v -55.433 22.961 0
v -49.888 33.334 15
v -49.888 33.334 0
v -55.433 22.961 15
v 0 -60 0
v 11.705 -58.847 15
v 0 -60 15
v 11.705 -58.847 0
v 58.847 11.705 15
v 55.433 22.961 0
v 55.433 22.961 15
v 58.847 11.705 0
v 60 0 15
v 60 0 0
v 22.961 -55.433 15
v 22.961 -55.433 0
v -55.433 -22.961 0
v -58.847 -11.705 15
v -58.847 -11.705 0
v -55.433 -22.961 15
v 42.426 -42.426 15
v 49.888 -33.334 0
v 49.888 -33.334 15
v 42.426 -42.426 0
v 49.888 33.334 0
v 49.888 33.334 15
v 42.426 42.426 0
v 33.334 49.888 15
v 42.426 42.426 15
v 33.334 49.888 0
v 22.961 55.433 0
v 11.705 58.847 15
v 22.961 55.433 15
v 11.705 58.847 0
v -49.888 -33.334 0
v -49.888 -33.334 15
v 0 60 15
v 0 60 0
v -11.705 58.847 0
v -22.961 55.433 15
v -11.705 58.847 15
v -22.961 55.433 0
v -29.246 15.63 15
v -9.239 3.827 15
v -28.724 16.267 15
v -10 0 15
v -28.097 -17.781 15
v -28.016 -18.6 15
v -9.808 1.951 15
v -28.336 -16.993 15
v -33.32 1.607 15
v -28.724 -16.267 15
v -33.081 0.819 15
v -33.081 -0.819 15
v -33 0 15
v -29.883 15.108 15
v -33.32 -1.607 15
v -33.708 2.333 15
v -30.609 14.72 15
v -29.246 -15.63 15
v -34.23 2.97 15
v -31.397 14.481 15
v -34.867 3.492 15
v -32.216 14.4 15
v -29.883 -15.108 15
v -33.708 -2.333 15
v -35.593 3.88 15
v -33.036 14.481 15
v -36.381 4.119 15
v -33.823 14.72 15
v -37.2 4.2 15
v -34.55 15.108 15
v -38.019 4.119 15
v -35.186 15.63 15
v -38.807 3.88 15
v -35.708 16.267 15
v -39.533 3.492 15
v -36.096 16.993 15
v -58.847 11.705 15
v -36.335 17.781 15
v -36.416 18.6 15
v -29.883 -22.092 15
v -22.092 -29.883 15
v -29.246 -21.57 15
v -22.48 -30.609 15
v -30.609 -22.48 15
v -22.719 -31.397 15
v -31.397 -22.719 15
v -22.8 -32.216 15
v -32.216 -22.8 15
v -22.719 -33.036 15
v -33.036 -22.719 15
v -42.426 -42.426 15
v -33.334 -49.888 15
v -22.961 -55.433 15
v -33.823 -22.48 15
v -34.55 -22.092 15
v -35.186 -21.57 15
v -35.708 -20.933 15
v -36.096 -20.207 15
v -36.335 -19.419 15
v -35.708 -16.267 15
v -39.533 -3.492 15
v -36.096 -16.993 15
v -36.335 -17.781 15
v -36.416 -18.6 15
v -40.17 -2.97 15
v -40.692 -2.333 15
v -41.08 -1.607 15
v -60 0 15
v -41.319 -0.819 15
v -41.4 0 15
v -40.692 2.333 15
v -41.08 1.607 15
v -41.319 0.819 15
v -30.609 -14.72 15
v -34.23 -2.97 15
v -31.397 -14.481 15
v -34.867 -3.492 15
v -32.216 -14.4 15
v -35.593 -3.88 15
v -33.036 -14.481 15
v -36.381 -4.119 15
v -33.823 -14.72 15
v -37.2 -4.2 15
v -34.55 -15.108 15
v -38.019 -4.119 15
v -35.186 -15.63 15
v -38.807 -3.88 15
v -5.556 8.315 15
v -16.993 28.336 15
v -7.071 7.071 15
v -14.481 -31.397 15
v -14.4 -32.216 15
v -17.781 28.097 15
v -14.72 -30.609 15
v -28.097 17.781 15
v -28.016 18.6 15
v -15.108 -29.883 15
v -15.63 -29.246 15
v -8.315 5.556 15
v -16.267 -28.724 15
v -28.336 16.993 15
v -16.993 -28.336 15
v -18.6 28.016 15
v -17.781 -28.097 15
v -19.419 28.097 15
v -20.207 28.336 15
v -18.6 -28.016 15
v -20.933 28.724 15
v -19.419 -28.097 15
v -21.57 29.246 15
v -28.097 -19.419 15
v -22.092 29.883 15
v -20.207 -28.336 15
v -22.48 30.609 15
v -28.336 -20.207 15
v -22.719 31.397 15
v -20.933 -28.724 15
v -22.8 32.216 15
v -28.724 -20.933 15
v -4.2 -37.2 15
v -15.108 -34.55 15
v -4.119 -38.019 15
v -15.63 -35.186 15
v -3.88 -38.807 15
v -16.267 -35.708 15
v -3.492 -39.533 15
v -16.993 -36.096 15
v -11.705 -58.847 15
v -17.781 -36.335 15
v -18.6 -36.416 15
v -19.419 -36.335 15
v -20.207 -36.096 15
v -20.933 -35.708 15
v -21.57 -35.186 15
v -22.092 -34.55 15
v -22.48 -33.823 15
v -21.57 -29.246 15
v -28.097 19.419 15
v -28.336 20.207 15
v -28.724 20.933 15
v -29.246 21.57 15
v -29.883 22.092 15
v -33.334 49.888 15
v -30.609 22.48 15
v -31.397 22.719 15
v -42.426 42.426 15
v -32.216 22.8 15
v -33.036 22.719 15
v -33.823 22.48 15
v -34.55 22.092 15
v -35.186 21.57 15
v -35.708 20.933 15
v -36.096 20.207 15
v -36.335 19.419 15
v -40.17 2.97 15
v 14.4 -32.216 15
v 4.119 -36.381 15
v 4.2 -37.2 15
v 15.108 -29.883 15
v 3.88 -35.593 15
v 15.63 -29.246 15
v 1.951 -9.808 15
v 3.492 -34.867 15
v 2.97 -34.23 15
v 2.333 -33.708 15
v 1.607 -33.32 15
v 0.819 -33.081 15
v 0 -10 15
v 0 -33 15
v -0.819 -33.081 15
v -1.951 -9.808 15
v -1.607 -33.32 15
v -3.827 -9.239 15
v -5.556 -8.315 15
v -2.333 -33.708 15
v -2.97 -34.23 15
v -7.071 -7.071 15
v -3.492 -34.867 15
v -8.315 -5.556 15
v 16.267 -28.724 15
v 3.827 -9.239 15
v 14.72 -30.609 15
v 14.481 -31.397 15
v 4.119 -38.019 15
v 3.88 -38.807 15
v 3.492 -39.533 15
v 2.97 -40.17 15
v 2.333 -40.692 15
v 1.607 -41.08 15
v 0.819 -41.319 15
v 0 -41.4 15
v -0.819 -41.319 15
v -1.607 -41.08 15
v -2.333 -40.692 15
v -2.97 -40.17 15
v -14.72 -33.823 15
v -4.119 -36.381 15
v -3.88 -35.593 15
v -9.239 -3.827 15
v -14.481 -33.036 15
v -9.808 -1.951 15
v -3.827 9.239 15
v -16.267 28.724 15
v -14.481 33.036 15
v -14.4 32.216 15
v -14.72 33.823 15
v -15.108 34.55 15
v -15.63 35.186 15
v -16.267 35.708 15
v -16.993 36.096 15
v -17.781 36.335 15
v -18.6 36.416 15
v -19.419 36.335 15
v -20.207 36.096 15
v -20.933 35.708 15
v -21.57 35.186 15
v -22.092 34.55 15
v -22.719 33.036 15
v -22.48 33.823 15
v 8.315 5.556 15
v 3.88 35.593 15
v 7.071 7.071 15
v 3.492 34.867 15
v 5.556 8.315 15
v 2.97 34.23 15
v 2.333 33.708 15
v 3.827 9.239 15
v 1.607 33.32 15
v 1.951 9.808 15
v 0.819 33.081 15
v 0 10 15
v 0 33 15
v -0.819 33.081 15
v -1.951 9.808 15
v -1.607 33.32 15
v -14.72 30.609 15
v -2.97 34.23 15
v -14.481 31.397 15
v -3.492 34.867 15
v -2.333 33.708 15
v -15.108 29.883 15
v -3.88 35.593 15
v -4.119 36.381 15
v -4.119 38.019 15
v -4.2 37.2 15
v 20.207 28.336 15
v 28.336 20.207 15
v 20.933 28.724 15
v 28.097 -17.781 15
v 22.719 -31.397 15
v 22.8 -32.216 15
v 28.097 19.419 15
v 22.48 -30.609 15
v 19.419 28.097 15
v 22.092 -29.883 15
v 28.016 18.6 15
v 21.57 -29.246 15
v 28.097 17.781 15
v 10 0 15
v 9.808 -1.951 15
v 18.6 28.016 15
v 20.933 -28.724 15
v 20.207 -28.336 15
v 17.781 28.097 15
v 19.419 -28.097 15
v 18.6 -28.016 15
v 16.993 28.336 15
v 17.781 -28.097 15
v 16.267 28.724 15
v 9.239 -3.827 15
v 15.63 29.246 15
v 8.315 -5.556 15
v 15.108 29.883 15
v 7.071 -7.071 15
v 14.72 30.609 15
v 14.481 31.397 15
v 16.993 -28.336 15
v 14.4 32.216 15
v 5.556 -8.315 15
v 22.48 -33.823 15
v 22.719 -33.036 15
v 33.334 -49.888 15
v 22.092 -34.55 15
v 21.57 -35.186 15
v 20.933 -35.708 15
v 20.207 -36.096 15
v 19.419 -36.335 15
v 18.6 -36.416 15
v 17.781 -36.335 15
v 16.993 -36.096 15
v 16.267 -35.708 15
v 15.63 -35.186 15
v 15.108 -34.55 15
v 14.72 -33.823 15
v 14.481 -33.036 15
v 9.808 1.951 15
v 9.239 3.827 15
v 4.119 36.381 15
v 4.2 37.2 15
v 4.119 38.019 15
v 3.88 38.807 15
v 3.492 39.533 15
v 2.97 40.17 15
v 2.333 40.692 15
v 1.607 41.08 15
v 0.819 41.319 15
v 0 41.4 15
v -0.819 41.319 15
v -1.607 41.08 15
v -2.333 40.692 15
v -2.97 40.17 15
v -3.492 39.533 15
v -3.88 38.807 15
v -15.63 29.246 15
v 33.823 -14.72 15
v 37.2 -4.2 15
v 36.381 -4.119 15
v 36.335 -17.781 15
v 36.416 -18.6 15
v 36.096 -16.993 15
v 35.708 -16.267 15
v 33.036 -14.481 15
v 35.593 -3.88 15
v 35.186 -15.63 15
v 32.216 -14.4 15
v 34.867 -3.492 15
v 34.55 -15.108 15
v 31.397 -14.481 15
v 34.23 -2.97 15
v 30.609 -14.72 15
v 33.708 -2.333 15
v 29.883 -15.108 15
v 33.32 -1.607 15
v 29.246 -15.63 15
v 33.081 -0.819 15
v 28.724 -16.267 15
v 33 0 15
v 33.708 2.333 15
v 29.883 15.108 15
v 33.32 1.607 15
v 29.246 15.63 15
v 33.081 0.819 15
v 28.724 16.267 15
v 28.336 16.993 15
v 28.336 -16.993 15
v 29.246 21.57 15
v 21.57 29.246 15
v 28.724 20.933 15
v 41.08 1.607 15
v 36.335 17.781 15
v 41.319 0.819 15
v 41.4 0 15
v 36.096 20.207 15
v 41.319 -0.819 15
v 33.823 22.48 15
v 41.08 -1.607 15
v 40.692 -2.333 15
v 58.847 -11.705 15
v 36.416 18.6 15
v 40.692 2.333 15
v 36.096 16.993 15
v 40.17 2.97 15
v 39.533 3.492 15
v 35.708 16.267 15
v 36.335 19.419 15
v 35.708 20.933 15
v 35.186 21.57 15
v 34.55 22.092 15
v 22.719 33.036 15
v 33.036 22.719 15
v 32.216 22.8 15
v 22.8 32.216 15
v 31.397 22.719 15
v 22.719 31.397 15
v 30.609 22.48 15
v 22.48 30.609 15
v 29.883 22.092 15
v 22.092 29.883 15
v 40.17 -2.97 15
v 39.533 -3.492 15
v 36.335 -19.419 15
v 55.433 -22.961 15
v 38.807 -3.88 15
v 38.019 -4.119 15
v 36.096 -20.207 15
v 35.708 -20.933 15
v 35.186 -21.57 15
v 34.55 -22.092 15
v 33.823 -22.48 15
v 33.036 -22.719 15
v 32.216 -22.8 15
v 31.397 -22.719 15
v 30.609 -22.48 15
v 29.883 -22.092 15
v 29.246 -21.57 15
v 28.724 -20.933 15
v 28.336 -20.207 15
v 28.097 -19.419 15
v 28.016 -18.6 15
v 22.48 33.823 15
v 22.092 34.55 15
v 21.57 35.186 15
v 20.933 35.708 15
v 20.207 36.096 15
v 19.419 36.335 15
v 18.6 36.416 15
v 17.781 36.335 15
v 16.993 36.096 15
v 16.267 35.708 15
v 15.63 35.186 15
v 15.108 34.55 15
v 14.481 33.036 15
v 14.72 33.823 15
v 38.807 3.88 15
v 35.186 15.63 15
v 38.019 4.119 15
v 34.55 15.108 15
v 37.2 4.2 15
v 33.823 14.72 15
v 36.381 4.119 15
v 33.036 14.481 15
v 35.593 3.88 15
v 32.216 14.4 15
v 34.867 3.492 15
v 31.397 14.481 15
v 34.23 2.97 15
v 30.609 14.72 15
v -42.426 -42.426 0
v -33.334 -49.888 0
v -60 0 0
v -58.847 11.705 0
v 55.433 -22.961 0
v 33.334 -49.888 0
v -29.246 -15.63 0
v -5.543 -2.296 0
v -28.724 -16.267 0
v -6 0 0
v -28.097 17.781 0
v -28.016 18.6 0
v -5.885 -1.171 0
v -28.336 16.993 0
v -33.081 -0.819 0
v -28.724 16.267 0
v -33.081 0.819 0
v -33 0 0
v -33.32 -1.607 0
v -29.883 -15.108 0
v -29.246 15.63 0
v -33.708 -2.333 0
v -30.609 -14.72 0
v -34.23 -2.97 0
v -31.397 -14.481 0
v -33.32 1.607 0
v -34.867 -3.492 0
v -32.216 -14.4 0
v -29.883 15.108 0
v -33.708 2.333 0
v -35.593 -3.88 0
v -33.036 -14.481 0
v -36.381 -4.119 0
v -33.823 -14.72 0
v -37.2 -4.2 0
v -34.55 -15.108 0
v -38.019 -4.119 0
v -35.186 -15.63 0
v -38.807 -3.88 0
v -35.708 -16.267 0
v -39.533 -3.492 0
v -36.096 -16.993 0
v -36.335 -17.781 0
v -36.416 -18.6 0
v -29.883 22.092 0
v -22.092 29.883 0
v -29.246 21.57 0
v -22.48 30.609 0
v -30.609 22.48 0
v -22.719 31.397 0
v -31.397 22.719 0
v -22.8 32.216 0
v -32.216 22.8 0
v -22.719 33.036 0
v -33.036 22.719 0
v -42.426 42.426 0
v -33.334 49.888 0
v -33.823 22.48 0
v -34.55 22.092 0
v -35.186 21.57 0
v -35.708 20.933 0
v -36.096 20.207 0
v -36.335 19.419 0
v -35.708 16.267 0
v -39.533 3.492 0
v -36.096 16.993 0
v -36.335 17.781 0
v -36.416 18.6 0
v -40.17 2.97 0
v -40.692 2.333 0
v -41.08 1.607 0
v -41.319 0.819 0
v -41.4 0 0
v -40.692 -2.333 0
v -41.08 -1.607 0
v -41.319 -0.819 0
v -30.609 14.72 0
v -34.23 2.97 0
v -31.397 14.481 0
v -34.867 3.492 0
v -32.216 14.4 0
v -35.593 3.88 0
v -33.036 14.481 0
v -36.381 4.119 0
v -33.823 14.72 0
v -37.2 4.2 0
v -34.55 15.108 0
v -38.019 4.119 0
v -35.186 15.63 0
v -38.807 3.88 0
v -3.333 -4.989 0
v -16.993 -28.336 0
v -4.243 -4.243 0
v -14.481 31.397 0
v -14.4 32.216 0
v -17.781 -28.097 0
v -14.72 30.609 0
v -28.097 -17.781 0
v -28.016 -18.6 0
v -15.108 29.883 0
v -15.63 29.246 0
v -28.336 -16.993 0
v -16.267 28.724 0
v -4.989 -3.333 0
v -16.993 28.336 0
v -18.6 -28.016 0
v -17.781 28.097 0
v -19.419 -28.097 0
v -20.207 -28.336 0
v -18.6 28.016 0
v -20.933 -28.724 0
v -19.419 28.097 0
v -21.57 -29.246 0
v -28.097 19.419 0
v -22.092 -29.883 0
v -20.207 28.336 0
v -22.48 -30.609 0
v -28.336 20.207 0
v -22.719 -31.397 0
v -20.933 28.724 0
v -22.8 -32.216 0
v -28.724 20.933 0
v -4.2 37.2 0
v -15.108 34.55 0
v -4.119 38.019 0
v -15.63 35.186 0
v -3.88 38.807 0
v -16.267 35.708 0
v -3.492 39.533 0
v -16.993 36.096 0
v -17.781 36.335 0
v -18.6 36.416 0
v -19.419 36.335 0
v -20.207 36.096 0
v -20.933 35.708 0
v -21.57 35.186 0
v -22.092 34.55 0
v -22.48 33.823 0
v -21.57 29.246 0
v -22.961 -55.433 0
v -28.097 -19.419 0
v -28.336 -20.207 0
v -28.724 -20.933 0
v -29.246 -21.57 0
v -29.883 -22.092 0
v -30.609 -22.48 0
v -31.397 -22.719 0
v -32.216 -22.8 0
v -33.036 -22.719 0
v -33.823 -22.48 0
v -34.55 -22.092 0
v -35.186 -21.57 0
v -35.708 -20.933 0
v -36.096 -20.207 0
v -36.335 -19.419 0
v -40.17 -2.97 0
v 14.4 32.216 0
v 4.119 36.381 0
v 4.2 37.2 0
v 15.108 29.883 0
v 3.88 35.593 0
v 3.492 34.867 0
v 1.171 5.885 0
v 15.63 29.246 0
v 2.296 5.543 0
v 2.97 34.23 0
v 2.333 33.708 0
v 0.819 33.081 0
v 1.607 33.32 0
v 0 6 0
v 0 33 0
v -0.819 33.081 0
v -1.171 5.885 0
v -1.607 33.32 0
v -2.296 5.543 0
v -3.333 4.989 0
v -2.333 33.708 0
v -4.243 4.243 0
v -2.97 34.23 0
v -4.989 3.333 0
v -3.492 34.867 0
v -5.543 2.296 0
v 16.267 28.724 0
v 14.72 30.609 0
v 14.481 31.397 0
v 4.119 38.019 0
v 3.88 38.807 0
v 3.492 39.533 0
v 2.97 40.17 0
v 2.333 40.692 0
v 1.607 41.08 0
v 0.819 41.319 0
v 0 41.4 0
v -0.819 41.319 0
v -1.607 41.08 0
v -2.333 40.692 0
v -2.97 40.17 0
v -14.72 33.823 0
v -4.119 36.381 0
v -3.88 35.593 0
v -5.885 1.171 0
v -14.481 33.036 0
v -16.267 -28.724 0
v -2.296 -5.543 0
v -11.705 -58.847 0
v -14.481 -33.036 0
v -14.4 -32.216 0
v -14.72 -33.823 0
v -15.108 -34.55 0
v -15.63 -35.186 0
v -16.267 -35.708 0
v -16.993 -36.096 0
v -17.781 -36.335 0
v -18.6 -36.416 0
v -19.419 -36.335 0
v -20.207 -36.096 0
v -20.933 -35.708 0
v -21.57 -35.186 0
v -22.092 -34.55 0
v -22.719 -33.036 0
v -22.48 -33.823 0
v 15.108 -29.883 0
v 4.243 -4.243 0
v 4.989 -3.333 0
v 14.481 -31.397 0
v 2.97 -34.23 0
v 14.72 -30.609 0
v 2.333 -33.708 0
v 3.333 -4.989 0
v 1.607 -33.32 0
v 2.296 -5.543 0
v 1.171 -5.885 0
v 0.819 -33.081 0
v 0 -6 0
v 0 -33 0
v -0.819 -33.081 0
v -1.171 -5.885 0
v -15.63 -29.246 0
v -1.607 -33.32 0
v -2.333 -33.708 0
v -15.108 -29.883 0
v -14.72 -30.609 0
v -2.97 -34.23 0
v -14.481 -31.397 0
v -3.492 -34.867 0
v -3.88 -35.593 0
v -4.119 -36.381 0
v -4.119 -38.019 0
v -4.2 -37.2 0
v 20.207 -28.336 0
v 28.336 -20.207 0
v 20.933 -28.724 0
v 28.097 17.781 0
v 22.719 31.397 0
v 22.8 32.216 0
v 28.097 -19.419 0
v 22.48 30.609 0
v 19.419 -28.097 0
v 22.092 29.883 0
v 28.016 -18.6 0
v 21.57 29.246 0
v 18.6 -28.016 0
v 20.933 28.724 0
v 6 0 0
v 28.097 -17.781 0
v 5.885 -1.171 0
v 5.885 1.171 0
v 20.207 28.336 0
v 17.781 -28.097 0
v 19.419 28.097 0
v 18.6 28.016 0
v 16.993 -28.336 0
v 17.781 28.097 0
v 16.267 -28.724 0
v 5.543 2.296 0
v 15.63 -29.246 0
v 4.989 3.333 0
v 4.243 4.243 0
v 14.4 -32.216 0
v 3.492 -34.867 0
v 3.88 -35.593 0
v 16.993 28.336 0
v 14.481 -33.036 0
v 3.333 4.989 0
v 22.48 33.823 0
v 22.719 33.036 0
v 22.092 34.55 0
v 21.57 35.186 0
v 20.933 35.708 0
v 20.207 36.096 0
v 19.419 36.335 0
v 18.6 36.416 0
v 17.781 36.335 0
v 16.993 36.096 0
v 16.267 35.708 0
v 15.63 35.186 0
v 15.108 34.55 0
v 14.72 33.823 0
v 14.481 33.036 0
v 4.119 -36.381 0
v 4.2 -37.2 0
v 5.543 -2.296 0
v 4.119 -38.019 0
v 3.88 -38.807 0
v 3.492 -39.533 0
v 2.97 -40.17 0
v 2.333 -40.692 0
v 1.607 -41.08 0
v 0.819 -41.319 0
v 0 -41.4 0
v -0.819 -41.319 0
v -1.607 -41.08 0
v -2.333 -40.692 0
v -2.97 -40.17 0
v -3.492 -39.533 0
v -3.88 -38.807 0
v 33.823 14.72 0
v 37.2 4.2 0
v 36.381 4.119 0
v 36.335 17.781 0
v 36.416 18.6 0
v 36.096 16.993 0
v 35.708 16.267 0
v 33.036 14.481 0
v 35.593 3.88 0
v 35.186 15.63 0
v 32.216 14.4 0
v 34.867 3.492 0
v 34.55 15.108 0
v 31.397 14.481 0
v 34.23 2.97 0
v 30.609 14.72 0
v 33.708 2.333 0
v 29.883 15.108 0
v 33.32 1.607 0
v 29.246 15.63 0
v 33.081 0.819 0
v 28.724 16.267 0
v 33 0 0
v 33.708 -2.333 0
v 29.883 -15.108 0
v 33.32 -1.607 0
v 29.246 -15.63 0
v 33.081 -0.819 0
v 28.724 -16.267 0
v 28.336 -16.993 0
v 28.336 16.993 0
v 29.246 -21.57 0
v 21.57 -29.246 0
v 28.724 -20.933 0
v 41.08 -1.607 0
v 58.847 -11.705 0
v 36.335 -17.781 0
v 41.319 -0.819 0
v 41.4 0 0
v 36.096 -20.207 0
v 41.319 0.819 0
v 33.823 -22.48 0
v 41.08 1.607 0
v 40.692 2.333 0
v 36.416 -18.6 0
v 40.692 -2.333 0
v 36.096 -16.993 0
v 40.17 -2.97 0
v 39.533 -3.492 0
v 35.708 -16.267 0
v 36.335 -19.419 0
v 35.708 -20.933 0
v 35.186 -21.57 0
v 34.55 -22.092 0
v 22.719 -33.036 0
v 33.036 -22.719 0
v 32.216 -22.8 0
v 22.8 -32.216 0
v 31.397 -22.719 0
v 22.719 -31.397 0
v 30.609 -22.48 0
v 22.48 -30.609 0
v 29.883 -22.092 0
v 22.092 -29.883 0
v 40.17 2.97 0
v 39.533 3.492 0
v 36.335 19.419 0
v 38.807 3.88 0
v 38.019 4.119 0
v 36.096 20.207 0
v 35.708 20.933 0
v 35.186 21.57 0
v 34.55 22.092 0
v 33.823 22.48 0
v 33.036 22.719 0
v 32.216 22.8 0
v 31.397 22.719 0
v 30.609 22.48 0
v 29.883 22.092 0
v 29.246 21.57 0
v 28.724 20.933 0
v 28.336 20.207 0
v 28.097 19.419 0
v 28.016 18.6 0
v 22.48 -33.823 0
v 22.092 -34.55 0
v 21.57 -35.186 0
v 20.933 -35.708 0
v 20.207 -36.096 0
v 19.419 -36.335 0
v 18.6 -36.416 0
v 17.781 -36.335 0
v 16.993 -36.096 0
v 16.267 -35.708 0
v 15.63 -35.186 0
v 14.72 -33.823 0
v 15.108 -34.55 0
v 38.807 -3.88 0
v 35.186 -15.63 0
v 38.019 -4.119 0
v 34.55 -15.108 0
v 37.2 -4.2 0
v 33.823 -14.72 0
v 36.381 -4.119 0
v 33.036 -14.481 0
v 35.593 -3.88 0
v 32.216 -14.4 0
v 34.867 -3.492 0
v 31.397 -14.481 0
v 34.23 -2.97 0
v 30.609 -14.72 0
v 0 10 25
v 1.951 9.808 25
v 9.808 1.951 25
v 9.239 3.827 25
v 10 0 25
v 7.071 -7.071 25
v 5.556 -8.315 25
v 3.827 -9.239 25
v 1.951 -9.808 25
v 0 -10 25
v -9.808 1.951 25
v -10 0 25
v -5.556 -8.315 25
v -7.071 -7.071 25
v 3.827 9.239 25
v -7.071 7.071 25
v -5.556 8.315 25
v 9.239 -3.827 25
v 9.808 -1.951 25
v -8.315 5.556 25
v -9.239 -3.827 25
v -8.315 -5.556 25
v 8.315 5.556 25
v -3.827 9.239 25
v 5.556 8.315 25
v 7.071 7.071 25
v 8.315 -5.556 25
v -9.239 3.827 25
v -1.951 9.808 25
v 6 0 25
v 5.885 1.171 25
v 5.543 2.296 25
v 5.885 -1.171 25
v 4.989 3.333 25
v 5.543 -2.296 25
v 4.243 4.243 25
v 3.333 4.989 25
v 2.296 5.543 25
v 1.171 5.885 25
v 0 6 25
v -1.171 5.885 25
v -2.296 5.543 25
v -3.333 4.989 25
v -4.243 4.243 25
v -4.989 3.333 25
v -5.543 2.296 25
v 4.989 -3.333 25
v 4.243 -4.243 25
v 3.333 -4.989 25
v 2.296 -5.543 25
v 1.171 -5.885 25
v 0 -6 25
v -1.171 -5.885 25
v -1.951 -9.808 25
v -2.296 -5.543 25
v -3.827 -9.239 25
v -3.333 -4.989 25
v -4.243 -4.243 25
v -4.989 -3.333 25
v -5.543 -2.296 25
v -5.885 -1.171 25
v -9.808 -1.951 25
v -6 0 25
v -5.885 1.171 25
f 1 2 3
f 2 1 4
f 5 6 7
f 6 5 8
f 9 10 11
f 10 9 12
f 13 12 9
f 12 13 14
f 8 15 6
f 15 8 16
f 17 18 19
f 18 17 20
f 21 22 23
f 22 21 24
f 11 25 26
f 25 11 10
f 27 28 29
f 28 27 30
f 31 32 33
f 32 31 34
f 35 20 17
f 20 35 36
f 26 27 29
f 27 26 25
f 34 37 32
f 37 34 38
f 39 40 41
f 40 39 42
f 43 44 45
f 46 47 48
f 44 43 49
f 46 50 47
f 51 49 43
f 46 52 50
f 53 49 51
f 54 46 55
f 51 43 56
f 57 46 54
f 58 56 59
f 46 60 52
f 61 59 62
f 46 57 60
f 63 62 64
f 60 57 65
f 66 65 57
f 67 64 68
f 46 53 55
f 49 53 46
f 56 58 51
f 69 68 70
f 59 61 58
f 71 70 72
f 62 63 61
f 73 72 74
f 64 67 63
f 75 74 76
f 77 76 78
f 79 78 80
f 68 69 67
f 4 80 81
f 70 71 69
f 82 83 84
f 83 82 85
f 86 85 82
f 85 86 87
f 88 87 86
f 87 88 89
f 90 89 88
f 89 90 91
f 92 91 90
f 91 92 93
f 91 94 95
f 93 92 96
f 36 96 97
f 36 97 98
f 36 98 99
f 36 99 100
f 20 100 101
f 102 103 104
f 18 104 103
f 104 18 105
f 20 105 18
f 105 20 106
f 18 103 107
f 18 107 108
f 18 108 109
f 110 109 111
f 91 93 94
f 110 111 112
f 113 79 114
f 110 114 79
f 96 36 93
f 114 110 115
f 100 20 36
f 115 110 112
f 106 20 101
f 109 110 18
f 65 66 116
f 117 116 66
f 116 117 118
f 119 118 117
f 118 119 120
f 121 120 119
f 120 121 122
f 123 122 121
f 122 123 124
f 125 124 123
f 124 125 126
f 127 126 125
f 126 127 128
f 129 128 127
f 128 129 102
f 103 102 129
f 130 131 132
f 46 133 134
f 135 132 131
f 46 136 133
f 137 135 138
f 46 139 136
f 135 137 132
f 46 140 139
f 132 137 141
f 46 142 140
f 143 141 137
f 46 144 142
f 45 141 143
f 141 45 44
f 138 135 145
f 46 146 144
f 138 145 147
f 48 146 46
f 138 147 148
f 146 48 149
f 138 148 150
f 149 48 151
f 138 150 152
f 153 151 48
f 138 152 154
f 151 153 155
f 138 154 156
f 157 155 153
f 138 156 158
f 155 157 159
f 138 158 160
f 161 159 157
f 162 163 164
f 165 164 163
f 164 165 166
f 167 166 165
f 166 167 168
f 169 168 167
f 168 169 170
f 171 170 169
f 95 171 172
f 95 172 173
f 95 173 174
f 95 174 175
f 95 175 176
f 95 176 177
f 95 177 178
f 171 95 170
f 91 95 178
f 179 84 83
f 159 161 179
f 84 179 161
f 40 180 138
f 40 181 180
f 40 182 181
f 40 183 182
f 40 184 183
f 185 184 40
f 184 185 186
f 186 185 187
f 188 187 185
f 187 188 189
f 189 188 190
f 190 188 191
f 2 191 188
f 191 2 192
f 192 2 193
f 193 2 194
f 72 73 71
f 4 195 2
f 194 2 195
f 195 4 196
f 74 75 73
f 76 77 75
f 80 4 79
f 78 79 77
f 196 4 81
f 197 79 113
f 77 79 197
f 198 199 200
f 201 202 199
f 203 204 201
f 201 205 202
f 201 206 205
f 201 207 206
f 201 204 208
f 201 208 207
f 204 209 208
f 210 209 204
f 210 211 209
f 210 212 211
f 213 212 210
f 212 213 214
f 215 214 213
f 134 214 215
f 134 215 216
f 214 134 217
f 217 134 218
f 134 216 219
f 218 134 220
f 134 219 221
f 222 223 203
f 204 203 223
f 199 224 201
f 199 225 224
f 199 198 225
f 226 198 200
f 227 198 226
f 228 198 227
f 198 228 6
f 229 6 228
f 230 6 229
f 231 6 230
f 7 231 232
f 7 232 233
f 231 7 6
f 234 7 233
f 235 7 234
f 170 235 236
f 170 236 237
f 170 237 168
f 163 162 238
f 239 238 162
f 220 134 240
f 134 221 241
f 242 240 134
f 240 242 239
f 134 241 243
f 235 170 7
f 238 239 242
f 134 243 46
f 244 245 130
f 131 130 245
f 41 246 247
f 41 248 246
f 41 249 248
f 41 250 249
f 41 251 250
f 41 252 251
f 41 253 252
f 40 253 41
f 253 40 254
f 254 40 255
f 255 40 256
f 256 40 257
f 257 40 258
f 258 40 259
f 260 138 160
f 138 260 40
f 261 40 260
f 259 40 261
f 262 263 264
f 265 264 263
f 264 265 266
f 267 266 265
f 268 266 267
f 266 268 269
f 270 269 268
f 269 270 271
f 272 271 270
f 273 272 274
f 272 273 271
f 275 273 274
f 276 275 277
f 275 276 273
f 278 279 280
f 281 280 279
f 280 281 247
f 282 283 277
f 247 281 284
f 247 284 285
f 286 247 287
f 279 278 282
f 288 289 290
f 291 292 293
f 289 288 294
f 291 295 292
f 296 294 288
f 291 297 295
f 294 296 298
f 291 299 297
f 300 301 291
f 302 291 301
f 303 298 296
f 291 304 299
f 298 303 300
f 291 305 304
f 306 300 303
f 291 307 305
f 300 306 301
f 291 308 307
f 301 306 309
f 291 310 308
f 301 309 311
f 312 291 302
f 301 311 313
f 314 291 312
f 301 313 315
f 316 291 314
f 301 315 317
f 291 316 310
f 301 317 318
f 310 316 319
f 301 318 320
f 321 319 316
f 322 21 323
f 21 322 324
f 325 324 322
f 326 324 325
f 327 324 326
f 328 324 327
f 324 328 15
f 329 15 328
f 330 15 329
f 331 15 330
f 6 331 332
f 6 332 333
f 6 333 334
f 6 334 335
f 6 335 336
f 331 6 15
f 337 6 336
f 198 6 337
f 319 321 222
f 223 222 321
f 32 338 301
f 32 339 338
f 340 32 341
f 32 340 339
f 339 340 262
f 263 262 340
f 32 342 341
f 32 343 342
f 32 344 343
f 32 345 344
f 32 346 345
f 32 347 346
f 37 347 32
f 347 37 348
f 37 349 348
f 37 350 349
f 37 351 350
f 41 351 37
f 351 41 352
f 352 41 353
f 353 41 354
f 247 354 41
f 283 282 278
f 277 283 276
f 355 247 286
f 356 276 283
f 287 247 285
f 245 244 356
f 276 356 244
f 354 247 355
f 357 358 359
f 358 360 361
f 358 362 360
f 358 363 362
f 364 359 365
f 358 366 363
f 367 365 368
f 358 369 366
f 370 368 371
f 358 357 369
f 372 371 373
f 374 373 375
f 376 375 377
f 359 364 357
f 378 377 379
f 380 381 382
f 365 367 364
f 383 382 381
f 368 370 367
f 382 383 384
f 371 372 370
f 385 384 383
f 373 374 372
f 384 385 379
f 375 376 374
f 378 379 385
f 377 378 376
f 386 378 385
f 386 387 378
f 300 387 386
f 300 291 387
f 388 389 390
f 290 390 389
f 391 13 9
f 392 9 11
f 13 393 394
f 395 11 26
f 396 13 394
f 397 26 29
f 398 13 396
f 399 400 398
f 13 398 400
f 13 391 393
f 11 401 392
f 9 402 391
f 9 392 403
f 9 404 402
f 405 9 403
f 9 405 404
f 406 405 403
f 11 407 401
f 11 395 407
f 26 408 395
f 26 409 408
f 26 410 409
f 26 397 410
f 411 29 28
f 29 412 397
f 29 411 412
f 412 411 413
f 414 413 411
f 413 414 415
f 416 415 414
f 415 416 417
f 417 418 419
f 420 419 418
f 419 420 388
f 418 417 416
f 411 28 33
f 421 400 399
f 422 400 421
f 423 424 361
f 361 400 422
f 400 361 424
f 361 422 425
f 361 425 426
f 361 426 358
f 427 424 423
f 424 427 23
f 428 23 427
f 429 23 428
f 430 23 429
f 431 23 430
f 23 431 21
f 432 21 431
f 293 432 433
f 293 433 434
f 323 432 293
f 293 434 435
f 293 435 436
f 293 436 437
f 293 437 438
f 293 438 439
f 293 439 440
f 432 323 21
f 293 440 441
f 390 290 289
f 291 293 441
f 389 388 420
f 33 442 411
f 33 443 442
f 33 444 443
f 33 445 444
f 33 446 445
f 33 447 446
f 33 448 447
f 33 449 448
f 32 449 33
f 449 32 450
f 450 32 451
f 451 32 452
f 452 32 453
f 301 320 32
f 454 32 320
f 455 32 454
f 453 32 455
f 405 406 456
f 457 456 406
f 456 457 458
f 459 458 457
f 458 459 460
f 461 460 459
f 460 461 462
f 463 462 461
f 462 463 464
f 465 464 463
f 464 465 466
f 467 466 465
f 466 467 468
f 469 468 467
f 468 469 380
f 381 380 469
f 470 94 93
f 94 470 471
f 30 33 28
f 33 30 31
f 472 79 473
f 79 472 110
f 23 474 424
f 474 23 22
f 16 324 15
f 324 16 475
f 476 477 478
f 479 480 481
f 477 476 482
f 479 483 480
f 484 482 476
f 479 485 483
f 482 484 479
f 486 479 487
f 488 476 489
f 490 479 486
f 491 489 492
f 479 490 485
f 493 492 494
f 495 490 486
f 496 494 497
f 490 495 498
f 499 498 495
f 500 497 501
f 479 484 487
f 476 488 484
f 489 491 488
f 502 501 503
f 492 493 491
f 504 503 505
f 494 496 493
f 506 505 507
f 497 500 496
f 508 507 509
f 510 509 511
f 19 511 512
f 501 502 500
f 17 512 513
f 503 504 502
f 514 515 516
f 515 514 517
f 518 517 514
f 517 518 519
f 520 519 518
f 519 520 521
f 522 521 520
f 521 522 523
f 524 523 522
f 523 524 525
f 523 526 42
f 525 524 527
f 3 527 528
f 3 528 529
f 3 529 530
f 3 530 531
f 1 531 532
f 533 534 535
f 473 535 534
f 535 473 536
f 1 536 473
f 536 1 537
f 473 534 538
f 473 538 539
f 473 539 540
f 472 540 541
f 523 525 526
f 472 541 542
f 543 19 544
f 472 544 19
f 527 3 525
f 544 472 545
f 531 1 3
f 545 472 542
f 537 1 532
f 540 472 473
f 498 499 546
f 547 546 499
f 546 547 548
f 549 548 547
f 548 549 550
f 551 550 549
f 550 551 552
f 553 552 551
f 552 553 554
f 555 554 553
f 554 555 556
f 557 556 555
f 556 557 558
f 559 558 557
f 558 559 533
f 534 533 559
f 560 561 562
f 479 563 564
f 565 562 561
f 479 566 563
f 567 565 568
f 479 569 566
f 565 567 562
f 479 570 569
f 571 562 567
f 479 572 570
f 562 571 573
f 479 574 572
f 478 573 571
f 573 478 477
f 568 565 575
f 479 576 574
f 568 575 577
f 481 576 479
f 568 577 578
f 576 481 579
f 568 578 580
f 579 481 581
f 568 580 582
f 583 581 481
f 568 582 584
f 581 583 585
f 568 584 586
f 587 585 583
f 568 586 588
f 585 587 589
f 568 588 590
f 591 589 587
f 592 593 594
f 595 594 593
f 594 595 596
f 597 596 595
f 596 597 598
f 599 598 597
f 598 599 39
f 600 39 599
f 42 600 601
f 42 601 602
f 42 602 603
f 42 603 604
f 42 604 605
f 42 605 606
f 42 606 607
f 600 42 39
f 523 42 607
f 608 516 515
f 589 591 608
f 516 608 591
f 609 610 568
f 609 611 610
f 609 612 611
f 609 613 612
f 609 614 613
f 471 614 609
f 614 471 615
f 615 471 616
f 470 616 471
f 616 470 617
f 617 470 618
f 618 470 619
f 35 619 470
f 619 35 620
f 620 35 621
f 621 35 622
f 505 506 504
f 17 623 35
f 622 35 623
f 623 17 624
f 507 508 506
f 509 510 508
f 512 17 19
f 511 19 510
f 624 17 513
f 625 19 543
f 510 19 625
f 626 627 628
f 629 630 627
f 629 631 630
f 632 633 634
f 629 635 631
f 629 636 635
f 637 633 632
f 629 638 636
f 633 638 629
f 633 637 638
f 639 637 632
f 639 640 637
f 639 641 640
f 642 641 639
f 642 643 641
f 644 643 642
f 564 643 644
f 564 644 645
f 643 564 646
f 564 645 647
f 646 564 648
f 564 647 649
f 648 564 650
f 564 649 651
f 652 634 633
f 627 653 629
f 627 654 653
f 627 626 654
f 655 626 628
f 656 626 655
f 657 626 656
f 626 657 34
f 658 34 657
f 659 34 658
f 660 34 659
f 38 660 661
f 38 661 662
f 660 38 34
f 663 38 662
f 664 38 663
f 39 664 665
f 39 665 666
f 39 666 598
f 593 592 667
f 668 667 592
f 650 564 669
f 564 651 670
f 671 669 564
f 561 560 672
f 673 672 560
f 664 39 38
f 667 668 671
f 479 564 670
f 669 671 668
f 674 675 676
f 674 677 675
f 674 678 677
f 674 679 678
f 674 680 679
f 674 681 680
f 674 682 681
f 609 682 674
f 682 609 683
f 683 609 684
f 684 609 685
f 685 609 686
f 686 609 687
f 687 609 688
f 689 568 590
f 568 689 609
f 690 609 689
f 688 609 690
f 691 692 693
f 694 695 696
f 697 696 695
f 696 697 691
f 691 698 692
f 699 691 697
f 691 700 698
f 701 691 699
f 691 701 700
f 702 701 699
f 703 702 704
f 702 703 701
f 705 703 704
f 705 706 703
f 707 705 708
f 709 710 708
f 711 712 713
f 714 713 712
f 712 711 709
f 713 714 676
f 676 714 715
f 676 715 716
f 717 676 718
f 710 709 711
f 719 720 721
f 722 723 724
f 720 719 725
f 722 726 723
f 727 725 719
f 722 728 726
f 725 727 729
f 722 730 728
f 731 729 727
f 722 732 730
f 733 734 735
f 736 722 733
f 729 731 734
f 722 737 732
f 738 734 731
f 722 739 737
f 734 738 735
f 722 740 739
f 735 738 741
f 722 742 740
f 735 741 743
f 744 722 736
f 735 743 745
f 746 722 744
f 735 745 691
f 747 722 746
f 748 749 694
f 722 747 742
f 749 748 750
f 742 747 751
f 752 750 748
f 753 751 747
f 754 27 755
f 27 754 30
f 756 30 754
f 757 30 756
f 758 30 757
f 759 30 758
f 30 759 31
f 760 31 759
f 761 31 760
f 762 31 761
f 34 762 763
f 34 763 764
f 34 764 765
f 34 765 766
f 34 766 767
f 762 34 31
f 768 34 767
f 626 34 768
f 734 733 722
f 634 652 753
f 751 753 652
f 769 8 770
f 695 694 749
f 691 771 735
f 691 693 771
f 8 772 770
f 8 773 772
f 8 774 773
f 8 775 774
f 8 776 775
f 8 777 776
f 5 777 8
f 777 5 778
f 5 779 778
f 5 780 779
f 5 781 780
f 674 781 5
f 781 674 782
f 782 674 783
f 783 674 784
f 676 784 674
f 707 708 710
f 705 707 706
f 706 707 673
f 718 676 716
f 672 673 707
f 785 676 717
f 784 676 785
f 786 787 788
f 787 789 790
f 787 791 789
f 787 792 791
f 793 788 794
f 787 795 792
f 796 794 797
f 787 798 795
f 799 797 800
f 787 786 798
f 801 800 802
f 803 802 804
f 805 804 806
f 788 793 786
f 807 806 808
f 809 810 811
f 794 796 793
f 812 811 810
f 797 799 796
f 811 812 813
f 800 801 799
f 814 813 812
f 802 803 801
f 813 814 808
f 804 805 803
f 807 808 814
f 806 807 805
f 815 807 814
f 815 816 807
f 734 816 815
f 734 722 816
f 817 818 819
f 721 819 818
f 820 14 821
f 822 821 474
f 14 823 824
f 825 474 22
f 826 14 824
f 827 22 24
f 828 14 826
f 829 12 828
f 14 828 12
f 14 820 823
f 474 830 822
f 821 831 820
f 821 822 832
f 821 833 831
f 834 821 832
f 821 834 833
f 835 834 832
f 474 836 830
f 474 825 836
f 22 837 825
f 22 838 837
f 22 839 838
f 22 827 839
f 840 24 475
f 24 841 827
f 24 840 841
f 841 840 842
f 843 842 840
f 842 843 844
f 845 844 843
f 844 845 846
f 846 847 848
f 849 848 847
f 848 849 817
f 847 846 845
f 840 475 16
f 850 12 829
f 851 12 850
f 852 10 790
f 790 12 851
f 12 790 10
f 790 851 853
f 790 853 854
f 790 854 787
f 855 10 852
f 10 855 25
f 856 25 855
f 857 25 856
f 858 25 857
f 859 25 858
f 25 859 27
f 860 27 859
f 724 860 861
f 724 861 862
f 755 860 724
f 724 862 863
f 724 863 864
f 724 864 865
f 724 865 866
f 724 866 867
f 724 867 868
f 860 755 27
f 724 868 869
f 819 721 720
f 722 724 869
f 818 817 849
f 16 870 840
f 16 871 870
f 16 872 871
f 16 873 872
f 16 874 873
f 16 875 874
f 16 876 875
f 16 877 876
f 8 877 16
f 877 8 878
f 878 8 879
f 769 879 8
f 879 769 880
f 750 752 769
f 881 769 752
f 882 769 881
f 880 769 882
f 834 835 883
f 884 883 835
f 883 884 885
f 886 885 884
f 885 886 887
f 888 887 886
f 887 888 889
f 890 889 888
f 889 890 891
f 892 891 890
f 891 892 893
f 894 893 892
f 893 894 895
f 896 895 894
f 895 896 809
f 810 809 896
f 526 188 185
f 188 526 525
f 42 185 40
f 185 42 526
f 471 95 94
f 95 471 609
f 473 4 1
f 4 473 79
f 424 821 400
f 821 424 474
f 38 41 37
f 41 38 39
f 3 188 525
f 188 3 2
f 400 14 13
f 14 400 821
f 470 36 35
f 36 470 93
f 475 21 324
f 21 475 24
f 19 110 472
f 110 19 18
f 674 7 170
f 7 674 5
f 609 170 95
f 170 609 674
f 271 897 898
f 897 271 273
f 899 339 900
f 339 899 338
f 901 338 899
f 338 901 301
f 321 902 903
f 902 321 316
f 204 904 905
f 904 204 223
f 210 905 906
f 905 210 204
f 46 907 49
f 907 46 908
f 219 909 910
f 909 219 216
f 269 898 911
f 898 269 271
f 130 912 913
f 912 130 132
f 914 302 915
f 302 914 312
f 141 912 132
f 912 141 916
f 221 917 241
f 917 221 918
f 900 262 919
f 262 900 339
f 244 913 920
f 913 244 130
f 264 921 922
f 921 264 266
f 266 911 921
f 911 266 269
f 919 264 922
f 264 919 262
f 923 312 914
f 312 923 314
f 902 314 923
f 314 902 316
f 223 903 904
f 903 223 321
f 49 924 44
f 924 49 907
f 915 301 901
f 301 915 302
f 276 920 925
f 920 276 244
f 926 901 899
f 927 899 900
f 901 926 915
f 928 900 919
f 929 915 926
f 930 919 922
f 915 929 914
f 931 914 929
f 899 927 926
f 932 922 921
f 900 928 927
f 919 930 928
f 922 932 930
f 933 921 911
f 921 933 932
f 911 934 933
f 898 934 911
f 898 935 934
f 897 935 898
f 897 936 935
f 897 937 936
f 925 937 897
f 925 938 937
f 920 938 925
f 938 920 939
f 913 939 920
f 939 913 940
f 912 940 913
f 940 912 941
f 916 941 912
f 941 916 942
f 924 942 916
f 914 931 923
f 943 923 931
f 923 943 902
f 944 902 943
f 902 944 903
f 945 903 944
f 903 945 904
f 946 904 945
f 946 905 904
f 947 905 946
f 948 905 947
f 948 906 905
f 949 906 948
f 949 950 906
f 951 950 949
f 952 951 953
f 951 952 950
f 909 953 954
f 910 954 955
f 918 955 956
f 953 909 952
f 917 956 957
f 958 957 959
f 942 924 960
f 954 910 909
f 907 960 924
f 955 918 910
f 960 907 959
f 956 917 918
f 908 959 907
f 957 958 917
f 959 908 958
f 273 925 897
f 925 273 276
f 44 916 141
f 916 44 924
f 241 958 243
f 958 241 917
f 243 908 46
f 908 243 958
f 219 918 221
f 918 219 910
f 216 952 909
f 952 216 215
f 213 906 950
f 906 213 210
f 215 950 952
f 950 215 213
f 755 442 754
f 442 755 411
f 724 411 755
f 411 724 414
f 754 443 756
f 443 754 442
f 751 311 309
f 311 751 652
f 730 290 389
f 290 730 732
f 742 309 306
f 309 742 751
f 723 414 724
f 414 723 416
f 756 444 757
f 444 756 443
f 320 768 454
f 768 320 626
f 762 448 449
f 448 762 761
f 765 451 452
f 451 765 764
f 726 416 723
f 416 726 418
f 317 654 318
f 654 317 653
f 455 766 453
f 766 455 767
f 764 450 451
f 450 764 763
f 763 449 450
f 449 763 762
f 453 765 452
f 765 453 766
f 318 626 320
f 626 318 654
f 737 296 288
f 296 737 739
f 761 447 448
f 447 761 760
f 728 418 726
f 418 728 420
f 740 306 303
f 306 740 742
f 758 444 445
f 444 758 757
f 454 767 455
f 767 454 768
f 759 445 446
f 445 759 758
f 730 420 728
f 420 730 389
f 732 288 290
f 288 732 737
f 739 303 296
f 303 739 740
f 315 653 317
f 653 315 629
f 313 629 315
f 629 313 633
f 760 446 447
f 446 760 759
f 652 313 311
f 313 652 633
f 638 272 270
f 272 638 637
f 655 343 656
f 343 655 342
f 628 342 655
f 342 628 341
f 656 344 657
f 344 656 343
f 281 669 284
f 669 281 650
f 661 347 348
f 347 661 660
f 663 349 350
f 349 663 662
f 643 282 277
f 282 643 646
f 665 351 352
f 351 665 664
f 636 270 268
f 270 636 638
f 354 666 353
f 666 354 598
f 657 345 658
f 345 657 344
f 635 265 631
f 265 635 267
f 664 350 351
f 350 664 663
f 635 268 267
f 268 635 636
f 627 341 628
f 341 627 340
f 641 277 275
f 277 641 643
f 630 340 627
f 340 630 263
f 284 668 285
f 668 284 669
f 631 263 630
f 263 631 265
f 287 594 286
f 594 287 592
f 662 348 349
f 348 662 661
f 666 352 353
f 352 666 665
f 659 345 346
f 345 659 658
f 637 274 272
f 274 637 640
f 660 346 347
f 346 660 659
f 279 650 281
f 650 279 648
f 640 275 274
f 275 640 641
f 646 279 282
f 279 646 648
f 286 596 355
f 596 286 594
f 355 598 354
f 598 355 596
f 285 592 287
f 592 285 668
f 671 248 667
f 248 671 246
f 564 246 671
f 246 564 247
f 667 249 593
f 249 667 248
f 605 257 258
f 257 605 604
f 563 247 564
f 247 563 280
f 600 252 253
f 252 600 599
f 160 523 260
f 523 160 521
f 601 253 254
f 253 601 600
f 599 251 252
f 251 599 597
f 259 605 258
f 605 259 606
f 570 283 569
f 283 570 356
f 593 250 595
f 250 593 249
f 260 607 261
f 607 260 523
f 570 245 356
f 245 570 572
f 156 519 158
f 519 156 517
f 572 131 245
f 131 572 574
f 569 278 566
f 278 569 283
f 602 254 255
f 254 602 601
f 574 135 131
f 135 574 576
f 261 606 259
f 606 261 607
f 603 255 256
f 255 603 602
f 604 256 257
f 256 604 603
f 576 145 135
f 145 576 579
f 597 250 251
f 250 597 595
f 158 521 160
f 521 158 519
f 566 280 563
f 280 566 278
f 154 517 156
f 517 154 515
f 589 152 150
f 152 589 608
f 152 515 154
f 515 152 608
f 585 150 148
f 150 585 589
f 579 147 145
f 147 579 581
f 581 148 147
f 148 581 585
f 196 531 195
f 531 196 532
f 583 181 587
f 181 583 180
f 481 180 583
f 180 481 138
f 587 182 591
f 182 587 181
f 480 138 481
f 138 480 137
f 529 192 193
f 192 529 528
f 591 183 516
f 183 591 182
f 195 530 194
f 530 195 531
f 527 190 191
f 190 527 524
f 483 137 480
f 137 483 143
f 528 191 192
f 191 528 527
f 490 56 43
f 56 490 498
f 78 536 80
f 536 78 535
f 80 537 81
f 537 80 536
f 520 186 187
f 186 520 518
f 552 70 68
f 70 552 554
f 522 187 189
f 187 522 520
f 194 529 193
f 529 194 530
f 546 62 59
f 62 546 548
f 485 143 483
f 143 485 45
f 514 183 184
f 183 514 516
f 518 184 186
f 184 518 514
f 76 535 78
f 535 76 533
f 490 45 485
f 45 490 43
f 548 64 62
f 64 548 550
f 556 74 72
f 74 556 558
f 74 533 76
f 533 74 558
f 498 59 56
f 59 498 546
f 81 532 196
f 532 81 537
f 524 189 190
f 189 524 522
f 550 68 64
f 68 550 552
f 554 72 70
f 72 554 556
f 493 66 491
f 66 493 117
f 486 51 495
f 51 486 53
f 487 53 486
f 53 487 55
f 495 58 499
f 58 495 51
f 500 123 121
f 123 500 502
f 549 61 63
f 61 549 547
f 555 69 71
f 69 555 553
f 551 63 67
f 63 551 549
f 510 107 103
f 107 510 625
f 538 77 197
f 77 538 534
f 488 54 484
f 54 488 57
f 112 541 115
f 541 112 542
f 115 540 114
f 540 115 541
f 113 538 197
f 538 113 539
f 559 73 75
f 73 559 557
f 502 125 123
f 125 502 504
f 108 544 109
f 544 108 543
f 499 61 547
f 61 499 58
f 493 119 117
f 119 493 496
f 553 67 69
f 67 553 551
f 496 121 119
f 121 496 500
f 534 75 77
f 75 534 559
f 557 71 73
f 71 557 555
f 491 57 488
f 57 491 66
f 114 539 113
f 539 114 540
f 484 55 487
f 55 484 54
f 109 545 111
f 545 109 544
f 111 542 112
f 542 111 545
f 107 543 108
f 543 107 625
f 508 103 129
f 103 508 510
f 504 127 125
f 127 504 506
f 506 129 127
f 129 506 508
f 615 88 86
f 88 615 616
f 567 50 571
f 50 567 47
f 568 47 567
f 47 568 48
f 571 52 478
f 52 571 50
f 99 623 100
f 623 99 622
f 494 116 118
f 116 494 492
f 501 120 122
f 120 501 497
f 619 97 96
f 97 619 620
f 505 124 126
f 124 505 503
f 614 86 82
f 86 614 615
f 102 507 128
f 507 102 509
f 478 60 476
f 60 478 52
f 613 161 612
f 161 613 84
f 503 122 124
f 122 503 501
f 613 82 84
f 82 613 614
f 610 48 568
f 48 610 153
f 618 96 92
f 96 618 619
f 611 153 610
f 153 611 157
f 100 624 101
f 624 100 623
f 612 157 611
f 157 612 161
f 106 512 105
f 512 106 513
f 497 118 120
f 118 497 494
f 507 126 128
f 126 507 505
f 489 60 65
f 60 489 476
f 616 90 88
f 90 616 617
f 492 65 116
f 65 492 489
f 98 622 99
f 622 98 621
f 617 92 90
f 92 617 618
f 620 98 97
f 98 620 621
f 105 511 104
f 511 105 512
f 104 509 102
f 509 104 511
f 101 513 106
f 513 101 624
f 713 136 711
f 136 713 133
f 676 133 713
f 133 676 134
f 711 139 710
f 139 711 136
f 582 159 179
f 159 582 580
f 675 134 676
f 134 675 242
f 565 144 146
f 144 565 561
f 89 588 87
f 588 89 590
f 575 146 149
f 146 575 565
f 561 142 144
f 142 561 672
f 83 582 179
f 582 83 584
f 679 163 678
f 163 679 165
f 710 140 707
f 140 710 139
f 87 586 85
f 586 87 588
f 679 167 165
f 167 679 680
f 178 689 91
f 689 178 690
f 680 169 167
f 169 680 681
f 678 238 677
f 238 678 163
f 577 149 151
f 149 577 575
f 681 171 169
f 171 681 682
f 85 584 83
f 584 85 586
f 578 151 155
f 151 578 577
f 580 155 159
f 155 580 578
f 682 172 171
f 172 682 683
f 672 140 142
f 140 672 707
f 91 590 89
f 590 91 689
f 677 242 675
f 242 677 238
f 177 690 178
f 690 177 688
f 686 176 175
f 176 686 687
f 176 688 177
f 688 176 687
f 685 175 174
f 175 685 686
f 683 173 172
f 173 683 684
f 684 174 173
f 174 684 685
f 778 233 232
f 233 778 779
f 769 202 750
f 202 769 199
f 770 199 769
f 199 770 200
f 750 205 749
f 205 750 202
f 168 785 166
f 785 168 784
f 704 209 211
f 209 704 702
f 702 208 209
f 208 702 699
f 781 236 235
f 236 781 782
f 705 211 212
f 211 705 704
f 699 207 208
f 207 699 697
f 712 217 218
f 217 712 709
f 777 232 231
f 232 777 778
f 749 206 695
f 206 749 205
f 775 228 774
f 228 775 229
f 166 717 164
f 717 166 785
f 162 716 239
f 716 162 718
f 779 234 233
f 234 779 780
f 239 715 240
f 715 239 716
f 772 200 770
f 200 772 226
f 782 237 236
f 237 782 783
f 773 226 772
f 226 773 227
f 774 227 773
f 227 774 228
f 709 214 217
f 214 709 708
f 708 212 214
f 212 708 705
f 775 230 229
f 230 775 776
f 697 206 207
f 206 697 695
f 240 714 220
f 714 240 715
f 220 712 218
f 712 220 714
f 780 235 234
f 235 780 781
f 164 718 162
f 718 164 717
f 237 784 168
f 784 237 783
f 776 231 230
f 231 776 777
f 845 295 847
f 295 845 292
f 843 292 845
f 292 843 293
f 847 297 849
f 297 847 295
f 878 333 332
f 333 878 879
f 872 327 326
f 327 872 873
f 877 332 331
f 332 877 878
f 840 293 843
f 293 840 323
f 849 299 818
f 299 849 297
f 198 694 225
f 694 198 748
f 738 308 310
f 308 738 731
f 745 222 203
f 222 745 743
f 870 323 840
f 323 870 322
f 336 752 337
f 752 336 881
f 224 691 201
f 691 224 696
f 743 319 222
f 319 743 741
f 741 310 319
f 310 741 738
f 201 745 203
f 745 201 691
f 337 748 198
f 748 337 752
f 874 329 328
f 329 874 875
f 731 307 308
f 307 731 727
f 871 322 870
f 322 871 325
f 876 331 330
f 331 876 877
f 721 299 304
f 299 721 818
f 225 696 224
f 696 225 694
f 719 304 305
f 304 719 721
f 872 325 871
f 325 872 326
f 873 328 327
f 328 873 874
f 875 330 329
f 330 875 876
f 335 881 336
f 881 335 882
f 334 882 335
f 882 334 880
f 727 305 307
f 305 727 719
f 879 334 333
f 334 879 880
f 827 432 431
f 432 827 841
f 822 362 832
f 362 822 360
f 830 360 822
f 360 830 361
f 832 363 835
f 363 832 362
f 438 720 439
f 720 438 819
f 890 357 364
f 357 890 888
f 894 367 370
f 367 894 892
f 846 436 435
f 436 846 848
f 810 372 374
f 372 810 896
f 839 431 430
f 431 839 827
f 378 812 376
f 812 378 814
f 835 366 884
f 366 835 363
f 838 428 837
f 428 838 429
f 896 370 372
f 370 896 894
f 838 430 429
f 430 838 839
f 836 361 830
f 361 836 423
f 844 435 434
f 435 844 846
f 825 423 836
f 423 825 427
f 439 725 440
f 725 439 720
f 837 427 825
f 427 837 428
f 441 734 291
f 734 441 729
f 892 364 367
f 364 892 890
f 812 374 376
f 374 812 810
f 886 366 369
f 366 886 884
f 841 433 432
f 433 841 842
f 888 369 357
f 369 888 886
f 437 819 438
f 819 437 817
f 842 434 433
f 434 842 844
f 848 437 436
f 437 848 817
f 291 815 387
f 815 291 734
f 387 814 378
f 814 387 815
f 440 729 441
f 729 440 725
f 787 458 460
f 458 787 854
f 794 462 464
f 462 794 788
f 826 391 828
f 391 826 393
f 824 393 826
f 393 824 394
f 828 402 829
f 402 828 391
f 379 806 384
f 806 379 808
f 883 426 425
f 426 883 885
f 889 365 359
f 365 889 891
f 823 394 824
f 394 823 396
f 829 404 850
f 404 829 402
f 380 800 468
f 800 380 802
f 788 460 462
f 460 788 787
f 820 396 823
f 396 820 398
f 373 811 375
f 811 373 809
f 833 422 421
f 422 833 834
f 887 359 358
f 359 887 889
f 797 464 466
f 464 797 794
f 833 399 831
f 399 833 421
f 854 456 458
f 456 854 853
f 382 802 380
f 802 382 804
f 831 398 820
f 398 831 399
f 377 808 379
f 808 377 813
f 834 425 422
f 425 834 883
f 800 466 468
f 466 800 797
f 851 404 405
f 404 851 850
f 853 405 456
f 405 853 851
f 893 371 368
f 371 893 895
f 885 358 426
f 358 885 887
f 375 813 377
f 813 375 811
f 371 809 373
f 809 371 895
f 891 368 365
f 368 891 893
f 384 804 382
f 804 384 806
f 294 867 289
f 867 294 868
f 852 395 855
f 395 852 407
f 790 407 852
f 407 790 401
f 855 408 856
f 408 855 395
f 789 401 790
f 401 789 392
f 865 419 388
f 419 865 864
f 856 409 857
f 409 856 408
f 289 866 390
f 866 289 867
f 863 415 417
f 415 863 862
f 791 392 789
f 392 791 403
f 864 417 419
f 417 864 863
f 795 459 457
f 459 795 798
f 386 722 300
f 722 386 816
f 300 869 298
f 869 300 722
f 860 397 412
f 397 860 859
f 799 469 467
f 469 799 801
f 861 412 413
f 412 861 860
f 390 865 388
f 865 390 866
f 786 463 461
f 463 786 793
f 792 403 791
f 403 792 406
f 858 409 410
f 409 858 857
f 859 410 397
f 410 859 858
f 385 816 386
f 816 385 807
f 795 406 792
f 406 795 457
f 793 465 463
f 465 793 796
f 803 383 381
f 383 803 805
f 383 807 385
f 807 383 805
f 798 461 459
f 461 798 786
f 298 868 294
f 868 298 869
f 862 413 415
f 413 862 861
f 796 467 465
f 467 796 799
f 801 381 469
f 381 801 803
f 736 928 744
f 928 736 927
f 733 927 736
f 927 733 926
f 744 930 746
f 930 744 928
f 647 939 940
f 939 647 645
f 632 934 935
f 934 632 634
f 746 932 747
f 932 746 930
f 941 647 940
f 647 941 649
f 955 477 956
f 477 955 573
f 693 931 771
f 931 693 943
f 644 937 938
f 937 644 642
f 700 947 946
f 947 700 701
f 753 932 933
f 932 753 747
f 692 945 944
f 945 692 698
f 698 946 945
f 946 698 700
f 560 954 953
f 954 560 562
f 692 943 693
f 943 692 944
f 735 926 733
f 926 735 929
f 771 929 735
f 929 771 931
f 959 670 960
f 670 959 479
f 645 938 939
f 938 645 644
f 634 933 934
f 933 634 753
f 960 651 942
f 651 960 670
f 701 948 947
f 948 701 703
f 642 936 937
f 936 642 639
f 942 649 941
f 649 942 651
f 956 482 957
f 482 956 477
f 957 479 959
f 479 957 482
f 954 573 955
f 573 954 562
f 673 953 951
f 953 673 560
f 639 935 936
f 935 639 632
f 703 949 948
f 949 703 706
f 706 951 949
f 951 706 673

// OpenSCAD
$fn = 32;

// ----------------------------------------------------------------------
// Flange Ø120 x 15
// 12 holes on a Ø74.4 bolt circle, bolted joints
// ----------------------------------------------------------------------

// --- parameters (mm) ---
flange_d = 120;  // outside diameter of the flange
thickness = 15;  // flange thickness
holes = 12;      // number of bolt holes
pcd = 74.4;      // bolt circle diameter
start_deg = 60;  // angle of the first hole, from +X
hole_d = 8.4;    // bolt hole diameter
bore_d = 12;     // central through bore
hub_d = 20;      // hub outside diameter
hub_h = 10;      // hub height above the flange face (0 = no hub)

// --- derived feature positions (mm) ---
height = thickness + hub_h;  // = 25   overall height of the part
pcd_r = pcd / 2;             // = 37.2   bolt circle radius
hole_step = 360 / holes;     // = 30   angular pitch
feature_centers = [
  [pcd_r * cos(start_deg + 0 * hole_step), pcd_r * sin(start_deg + 0 * hole_step)],
  [pcd_r * cos(start_deg + 1 * hole_step), pcd_r * sin(start_deg + 1 * hole_step)],
  [pcd_r * cos(start_deg + 2 * hole_step), pcd_r * sin(start_deg + 2 * hole_step)],
  [pcd_r * cos(start_deg + 3 * hole_step), pcd_r * sin(start_deg + 3 * hole_step)],
  [pcd_r * cos(start_deg + 4 * hole_step), pcd_r * sin(start_deg + 4 * hole_step)],
  [pcd_r * cos(start_deg + 5 * hole_step), pcd_r * sin(start_deg + 5 * hole_step)],
  [pcd_r * cos(start_deg + 6 * hole_step), pcd_r * sin(start_deg + 6 * hole_step)],
  [pcd_r * cos(start_deg + 7 * hole_step), pcd_r * sin(start_deg + 7 * hole_step)],
  [pcd_r * cos(start_deg + 8 * hole_step), pcd_r * sin(start_deg + 8 * hole_step)],
  [pcd_r * cos(start_deg + 9 * hole_step), pcd_r * sin(start_deg + 9 * hole_step)],
  [pcd_r * cos(start_deg + 10 * hole_step), pcd_r * sin(start_deg + 10 * hole_step)],
  [pcd_r * cos(start_deg + 11 * hole_step), pcd_r * sin(start_deg + 11 * hole_step)]
];   // bolt hole centres on the pitch circle

// flange disc, every hole and the bore cut straight through
difference() {
  union() {
    cylinder(d = flange_d, h = thickness);
    cylinder(d = hub_d, h = height);  // hub, overlapped into the flange
  }
  translate([0, 0, -1]) cylinder(d = bore_d, h = height + 2);  // bore, through
  for (centre = feature_centers)
    translate([centre[0], centre[1], -1]) cylinder(d = hole_d, h = thickness + 2);
}
